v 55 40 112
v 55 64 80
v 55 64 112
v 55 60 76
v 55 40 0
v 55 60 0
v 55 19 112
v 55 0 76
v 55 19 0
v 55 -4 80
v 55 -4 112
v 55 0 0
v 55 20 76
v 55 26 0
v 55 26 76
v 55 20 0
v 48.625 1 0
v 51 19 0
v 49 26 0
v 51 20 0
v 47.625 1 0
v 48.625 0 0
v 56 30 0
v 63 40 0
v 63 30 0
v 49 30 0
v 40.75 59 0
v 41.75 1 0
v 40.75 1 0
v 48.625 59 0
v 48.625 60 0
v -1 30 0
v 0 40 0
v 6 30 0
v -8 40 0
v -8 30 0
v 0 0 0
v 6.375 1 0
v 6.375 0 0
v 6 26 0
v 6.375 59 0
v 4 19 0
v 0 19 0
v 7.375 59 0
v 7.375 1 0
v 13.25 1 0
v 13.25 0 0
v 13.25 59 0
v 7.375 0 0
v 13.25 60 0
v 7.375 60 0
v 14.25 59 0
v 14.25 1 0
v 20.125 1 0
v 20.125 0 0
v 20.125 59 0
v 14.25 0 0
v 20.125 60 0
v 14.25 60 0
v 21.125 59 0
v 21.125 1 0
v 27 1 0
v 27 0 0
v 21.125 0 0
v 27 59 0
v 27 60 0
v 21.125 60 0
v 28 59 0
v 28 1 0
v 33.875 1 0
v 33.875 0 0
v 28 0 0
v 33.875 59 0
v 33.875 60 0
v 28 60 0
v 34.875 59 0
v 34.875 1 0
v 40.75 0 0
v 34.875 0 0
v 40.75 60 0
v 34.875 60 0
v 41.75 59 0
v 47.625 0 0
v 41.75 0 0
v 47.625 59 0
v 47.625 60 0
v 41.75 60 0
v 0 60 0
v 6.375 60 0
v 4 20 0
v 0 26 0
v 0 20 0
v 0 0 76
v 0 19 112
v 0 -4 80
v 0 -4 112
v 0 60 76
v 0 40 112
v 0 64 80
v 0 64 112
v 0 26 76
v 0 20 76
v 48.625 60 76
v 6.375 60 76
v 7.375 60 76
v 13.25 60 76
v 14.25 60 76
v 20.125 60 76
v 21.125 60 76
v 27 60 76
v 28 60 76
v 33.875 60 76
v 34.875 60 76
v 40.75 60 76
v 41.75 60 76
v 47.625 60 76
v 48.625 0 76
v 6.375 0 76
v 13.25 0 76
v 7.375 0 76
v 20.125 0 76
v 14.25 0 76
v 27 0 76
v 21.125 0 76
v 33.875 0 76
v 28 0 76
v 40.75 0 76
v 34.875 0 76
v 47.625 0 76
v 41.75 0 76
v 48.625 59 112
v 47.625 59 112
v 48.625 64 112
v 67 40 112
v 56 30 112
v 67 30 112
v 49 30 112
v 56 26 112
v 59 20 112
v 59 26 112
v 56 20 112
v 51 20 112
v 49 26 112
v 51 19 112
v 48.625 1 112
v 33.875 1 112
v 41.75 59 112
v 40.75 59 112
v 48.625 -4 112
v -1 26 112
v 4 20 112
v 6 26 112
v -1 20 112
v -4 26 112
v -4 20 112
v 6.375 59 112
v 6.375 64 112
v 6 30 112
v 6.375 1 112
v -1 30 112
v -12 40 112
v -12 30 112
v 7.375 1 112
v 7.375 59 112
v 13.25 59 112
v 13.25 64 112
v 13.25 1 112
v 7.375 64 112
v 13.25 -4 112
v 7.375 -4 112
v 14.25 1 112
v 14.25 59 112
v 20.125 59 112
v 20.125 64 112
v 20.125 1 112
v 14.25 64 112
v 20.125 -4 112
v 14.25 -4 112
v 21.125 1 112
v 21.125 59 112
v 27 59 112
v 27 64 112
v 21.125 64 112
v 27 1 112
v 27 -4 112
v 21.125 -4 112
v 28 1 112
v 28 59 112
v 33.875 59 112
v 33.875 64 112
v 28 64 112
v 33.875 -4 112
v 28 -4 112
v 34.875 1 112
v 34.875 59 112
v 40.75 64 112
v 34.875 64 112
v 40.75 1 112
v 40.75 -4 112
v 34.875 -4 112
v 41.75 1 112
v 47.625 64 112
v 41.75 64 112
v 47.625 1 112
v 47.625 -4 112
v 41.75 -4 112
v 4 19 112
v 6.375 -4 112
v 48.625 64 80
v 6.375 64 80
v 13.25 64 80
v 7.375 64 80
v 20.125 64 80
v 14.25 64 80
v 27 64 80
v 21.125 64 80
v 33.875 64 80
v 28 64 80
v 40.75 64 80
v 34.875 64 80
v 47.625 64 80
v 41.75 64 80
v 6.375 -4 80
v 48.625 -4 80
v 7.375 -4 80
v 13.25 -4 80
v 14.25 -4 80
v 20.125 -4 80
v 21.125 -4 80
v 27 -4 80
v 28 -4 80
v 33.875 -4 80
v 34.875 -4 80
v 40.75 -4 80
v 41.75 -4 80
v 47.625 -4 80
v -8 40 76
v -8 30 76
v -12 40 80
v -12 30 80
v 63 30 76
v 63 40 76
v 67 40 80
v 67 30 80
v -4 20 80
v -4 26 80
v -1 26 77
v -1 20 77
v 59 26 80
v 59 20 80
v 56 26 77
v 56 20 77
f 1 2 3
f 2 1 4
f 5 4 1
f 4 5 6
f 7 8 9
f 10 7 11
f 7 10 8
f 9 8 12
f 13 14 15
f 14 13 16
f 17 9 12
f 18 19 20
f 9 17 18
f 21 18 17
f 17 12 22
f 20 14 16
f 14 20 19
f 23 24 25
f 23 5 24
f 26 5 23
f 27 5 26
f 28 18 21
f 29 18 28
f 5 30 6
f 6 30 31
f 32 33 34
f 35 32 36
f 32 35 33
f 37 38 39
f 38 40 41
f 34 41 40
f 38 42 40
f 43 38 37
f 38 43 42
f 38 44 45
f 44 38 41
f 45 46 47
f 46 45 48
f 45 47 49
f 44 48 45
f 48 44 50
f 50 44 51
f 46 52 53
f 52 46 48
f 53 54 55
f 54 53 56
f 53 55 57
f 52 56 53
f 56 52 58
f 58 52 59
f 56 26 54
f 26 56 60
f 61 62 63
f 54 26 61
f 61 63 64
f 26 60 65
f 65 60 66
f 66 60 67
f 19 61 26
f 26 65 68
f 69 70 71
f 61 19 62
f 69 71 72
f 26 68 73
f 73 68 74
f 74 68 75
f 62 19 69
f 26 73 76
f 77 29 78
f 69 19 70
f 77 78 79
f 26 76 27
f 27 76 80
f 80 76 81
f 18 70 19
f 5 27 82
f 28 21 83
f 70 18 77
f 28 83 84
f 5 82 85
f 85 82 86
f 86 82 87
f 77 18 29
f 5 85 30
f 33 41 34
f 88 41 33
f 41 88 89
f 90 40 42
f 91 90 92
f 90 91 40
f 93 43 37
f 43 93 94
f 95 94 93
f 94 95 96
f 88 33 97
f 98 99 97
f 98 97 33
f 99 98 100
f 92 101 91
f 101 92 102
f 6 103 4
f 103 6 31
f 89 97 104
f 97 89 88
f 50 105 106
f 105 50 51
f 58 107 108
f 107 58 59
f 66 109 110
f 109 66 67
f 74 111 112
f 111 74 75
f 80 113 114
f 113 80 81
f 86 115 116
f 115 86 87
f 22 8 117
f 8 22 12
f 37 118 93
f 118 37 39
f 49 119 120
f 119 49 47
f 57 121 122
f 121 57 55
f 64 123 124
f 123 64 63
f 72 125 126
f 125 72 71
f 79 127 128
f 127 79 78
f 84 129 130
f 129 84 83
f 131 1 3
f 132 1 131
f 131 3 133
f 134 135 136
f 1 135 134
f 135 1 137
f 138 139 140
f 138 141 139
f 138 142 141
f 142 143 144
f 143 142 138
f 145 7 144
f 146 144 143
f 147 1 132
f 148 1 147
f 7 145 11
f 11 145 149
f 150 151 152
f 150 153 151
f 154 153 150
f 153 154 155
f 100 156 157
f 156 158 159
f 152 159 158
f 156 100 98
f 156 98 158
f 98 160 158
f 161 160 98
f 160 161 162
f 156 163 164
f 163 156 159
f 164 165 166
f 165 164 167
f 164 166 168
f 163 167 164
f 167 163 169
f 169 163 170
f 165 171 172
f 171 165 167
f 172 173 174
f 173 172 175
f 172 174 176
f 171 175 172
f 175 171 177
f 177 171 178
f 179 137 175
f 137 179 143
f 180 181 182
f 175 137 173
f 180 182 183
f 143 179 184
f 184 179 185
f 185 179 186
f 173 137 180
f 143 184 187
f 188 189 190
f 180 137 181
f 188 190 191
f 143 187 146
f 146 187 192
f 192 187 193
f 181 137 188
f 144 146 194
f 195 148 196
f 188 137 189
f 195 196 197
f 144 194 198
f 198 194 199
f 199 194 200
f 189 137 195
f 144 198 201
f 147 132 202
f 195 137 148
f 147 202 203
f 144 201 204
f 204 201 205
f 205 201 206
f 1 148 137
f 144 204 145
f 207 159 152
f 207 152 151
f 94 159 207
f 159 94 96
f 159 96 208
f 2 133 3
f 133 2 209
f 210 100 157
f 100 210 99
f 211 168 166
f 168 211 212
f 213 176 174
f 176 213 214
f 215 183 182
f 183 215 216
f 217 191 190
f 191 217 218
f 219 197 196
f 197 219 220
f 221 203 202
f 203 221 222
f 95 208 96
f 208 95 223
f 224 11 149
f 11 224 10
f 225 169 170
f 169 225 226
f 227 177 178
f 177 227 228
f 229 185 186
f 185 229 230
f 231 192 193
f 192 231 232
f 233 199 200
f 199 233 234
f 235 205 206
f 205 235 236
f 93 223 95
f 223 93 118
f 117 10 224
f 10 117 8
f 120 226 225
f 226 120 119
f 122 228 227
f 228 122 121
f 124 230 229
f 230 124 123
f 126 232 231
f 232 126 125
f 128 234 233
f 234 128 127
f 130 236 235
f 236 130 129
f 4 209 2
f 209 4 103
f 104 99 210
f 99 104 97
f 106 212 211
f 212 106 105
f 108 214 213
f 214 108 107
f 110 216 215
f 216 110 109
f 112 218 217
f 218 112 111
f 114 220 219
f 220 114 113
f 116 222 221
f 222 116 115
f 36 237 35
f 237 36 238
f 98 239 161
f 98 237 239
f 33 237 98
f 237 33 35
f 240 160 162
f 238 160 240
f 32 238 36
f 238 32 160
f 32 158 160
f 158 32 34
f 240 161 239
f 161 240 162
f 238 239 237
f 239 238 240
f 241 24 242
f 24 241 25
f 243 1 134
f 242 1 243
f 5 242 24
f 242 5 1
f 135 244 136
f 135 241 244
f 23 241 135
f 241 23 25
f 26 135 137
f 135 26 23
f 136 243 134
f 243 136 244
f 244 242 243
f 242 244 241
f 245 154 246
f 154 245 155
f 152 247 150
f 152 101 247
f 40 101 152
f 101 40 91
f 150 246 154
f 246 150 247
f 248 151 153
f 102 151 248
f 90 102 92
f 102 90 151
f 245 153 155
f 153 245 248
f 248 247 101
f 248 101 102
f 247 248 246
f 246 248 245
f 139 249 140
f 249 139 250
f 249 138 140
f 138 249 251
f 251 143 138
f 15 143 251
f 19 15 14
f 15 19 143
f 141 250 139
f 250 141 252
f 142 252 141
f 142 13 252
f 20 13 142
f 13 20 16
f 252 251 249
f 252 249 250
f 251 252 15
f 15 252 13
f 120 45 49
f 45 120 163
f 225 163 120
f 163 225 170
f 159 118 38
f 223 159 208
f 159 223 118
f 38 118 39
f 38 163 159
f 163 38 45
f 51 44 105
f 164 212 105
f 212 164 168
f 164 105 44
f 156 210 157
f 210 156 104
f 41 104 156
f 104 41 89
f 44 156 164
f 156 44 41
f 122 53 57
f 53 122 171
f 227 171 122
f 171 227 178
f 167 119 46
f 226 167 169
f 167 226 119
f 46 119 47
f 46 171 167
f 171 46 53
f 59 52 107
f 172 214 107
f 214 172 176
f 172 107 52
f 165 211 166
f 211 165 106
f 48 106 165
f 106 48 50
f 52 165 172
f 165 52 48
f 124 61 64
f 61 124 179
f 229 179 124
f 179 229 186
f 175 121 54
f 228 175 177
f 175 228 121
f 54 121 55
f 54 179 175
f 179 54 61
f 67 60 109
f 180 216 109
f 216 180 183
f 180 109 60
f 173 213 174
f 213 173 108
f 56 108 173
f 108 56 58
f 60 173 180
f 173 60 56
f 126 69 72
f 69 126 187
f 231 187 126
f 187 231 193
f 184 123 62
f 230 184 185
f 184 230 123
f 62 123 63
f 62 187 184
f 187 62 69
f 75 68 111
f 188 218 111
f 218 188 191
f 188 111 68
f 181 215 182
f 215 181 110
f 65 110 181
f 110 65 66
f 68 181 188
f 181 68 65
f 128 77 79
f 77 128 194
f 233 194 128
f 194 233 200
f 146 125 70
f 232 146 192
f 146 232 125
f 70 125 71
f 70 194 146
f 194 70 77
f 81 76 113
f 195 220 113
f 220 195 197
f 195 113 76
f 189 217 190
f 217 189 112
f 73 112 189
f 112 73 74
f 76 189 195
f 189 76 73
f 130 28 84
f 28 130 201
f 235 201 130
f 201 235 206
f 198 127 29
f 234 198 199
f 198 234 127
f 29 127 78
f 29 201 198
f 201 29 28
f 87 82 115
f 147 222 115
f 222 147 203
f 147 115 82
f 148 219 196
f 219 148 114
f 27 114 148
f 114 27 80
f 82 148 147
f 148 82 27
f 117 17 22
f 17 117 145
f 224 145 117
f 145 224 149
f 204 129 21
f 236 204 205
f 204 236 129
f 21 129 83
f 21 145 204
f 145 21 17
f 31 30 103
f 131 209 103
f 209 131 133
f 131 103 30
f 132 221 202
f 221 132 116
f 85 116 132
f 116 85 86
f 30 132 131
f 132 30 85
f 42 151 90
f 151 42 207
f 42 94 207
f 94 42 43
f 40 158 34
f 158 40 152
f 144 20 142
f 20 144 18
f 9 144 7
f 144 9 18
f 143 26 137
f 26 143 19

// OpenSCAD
//Base Height
b_height = 80;

//Top Height
t_height = 32;

//Building Depth
length = 60;

//Building Width
width = 55;

//Building Overhang
overhang = 4;

//Cuts in Building
cuts = 7;

//Cut Width
cut_width = 1;

//Cut Depth
cut_depth =5;

//Large Side Fin width
finL_width = 8;

//Large Side Fin length
finL_length = 10;

//Large Side Fin Recess
finL_recess = 30;

//Large Side Fin Overhang
finL_overhang = 4;

//Small Side Fin width
finS_width = 0;

//Small Side Fin Length
finS_length = 6;

//Small Side Fin Recess
finS_recess = 20;

//Small Side Fin Overhang
finS_overhang = 4;

//Large Side Cut Width
cutS_width = 4;

//Small Side Cut Length
cutS_length = 1;

//Large Side Cut Width
cutL_width = 6;



difference()
{
     union() //Main Body
     {
            { //Basic Structure
            
        cube([width,length,b_height]); //Bottom Structure
        translate([0,-overhang,b_height]) cube([width,length+overhang*2,t_height]); //Top Structure
        }
        
            { //Front and Back Overhang Chamfers
        translate([0,0,b_height-overhang]) //Front Overhang Chamfer
               rotate([45,0,0]) 
               cube([width,sqrt(2*(pow(overhang,2))),sqrt(2*(pow(overhang,2)))]);

        translate([0,length,b_height-overhang]) //Back Overhang Chamfer
            rotate([45,0,0]) 
            cube([width,sqrt(2*(pow(overhang,2))),sqrt(2*(pow(overhang,2)))]);
        }
        
        
        
        
        
            { //Large side Fins
            
        translate([-finL_width,finL_recess,0]) //Left Fin Lower 
        cube([finL_width,finL_length,b_height]);
        translate([-finL_width-finL_overhang,finL_recess,b_height]) //Left Fin Upper 
        cube([finL_width+finL_overhang,finL_length,t_height]);
        
        translate([-finL_overhang-finL_width,finL_recess,b_height]) //Left Fin Overhang Chamfer
        rotate([0,45,0]) 
        cube([sqrt(2*(pow(finL_overhang,2))),finL_length,sqrt(2*(pow(finL_overhang,2)))]);
        
        translate([width,finL_recess,0]) //Right Fin Lower 
        cube([finL_width,finL_length,b_height]);
        translate([width,finL_recess,b_height]) //Right Fin Upper 
        cube([finL_width+finL_overhang,finL_length,t_height]);
        
        translate([width+finL_width-finL_overhang,finL_recess,b_height]) //Right Fin Overhang Chamfer
        rotate([0,45,0]) 
        cube([sqrt(2*pow(finL_overhang,2)),finL_length,sqrt(2*pow(finL_overhang,2))]);
            
        }
        
            { //Small side Fins
            
        translate([-finS_width,finS_recess,0]) //Left Fin Lower 
        cube([finS_width,finS_length,b_height]);
        translate([-finS_width-finS_overhang,finS_recess,b_height]) //Left Fin Upper 
        cube([finS_width+finS_overhang,finS_length,t_height]);
        
        translate([-finS_overhang-finS_width,finS_recess,b_height]) //Left Fin Overhang Chamfer
        rotate([0,45,0]) 
        cube([sqrt(2*(pow(finS_overhang,2))),finS_length,sqrt(2*(pow(finS_overhang,2)))]);
        
        translate([width,finS_recess,0]) //Right Fin Lower 
        cube([finS_width,finS_length,b_height]);
        translate([width,finS_recess,b_height]) //Right Fin Upper 
        cube([finS_width+finS_overhang,finS_length,t_height]);
        
        translate([width+finS_width-finS_overhang,finS_recess,b_height]) //Right Fin Overhang Chamfer
        rotate([0,45,0]) 
        cube([sqrt(2*pow(finS_overhang,2)),finS_length,sqrt(2*pow(finS_overhang,2))]); 
            
        }
     }

     for (i=[1:1:7]) // Cuts in front and back of building
     {
         
        translate([((width/(cuts+1))*i)-cut_width/2,-overhang-1,-1]) //Front
        cube([cut_width,cut_depth+1,b_height+t_height+2]);
        
        translate([((width/(cuts+1))*i)-cut_width/2,length-1,-1]) //Back
        cube([cut_width,cut_depth+1,b_height+t_height+2]);
     }
     
     
     
     { // Side Cuts
        translate([-1,finS_recess-cutS_length,-1]) //Small left Cut
        cube([cutS_width+1,cutS_length,b_height+t_height+2]);   
        translate([-1,(finS_recess+finS_length),-1]) //Large left Cut
        cube([cutL_width+1,finL_recess-(finS_recess+finS_length),b_height+t_height+2]);
     
        translate([width-cutS_width,finS_recess-cutS_length,-1]) //Small Right Cut
        cube([cutS_width+1,cutS_length,b_height+t_height+2]);   
        translate([width-cutL_width,(finS_recess+finS_length),-1]) //Large Right Cut
        cube([cutL_width+1,finL_recess-(finS_recess+finS_length),b_height+t_height+2]);
     }
     
}
